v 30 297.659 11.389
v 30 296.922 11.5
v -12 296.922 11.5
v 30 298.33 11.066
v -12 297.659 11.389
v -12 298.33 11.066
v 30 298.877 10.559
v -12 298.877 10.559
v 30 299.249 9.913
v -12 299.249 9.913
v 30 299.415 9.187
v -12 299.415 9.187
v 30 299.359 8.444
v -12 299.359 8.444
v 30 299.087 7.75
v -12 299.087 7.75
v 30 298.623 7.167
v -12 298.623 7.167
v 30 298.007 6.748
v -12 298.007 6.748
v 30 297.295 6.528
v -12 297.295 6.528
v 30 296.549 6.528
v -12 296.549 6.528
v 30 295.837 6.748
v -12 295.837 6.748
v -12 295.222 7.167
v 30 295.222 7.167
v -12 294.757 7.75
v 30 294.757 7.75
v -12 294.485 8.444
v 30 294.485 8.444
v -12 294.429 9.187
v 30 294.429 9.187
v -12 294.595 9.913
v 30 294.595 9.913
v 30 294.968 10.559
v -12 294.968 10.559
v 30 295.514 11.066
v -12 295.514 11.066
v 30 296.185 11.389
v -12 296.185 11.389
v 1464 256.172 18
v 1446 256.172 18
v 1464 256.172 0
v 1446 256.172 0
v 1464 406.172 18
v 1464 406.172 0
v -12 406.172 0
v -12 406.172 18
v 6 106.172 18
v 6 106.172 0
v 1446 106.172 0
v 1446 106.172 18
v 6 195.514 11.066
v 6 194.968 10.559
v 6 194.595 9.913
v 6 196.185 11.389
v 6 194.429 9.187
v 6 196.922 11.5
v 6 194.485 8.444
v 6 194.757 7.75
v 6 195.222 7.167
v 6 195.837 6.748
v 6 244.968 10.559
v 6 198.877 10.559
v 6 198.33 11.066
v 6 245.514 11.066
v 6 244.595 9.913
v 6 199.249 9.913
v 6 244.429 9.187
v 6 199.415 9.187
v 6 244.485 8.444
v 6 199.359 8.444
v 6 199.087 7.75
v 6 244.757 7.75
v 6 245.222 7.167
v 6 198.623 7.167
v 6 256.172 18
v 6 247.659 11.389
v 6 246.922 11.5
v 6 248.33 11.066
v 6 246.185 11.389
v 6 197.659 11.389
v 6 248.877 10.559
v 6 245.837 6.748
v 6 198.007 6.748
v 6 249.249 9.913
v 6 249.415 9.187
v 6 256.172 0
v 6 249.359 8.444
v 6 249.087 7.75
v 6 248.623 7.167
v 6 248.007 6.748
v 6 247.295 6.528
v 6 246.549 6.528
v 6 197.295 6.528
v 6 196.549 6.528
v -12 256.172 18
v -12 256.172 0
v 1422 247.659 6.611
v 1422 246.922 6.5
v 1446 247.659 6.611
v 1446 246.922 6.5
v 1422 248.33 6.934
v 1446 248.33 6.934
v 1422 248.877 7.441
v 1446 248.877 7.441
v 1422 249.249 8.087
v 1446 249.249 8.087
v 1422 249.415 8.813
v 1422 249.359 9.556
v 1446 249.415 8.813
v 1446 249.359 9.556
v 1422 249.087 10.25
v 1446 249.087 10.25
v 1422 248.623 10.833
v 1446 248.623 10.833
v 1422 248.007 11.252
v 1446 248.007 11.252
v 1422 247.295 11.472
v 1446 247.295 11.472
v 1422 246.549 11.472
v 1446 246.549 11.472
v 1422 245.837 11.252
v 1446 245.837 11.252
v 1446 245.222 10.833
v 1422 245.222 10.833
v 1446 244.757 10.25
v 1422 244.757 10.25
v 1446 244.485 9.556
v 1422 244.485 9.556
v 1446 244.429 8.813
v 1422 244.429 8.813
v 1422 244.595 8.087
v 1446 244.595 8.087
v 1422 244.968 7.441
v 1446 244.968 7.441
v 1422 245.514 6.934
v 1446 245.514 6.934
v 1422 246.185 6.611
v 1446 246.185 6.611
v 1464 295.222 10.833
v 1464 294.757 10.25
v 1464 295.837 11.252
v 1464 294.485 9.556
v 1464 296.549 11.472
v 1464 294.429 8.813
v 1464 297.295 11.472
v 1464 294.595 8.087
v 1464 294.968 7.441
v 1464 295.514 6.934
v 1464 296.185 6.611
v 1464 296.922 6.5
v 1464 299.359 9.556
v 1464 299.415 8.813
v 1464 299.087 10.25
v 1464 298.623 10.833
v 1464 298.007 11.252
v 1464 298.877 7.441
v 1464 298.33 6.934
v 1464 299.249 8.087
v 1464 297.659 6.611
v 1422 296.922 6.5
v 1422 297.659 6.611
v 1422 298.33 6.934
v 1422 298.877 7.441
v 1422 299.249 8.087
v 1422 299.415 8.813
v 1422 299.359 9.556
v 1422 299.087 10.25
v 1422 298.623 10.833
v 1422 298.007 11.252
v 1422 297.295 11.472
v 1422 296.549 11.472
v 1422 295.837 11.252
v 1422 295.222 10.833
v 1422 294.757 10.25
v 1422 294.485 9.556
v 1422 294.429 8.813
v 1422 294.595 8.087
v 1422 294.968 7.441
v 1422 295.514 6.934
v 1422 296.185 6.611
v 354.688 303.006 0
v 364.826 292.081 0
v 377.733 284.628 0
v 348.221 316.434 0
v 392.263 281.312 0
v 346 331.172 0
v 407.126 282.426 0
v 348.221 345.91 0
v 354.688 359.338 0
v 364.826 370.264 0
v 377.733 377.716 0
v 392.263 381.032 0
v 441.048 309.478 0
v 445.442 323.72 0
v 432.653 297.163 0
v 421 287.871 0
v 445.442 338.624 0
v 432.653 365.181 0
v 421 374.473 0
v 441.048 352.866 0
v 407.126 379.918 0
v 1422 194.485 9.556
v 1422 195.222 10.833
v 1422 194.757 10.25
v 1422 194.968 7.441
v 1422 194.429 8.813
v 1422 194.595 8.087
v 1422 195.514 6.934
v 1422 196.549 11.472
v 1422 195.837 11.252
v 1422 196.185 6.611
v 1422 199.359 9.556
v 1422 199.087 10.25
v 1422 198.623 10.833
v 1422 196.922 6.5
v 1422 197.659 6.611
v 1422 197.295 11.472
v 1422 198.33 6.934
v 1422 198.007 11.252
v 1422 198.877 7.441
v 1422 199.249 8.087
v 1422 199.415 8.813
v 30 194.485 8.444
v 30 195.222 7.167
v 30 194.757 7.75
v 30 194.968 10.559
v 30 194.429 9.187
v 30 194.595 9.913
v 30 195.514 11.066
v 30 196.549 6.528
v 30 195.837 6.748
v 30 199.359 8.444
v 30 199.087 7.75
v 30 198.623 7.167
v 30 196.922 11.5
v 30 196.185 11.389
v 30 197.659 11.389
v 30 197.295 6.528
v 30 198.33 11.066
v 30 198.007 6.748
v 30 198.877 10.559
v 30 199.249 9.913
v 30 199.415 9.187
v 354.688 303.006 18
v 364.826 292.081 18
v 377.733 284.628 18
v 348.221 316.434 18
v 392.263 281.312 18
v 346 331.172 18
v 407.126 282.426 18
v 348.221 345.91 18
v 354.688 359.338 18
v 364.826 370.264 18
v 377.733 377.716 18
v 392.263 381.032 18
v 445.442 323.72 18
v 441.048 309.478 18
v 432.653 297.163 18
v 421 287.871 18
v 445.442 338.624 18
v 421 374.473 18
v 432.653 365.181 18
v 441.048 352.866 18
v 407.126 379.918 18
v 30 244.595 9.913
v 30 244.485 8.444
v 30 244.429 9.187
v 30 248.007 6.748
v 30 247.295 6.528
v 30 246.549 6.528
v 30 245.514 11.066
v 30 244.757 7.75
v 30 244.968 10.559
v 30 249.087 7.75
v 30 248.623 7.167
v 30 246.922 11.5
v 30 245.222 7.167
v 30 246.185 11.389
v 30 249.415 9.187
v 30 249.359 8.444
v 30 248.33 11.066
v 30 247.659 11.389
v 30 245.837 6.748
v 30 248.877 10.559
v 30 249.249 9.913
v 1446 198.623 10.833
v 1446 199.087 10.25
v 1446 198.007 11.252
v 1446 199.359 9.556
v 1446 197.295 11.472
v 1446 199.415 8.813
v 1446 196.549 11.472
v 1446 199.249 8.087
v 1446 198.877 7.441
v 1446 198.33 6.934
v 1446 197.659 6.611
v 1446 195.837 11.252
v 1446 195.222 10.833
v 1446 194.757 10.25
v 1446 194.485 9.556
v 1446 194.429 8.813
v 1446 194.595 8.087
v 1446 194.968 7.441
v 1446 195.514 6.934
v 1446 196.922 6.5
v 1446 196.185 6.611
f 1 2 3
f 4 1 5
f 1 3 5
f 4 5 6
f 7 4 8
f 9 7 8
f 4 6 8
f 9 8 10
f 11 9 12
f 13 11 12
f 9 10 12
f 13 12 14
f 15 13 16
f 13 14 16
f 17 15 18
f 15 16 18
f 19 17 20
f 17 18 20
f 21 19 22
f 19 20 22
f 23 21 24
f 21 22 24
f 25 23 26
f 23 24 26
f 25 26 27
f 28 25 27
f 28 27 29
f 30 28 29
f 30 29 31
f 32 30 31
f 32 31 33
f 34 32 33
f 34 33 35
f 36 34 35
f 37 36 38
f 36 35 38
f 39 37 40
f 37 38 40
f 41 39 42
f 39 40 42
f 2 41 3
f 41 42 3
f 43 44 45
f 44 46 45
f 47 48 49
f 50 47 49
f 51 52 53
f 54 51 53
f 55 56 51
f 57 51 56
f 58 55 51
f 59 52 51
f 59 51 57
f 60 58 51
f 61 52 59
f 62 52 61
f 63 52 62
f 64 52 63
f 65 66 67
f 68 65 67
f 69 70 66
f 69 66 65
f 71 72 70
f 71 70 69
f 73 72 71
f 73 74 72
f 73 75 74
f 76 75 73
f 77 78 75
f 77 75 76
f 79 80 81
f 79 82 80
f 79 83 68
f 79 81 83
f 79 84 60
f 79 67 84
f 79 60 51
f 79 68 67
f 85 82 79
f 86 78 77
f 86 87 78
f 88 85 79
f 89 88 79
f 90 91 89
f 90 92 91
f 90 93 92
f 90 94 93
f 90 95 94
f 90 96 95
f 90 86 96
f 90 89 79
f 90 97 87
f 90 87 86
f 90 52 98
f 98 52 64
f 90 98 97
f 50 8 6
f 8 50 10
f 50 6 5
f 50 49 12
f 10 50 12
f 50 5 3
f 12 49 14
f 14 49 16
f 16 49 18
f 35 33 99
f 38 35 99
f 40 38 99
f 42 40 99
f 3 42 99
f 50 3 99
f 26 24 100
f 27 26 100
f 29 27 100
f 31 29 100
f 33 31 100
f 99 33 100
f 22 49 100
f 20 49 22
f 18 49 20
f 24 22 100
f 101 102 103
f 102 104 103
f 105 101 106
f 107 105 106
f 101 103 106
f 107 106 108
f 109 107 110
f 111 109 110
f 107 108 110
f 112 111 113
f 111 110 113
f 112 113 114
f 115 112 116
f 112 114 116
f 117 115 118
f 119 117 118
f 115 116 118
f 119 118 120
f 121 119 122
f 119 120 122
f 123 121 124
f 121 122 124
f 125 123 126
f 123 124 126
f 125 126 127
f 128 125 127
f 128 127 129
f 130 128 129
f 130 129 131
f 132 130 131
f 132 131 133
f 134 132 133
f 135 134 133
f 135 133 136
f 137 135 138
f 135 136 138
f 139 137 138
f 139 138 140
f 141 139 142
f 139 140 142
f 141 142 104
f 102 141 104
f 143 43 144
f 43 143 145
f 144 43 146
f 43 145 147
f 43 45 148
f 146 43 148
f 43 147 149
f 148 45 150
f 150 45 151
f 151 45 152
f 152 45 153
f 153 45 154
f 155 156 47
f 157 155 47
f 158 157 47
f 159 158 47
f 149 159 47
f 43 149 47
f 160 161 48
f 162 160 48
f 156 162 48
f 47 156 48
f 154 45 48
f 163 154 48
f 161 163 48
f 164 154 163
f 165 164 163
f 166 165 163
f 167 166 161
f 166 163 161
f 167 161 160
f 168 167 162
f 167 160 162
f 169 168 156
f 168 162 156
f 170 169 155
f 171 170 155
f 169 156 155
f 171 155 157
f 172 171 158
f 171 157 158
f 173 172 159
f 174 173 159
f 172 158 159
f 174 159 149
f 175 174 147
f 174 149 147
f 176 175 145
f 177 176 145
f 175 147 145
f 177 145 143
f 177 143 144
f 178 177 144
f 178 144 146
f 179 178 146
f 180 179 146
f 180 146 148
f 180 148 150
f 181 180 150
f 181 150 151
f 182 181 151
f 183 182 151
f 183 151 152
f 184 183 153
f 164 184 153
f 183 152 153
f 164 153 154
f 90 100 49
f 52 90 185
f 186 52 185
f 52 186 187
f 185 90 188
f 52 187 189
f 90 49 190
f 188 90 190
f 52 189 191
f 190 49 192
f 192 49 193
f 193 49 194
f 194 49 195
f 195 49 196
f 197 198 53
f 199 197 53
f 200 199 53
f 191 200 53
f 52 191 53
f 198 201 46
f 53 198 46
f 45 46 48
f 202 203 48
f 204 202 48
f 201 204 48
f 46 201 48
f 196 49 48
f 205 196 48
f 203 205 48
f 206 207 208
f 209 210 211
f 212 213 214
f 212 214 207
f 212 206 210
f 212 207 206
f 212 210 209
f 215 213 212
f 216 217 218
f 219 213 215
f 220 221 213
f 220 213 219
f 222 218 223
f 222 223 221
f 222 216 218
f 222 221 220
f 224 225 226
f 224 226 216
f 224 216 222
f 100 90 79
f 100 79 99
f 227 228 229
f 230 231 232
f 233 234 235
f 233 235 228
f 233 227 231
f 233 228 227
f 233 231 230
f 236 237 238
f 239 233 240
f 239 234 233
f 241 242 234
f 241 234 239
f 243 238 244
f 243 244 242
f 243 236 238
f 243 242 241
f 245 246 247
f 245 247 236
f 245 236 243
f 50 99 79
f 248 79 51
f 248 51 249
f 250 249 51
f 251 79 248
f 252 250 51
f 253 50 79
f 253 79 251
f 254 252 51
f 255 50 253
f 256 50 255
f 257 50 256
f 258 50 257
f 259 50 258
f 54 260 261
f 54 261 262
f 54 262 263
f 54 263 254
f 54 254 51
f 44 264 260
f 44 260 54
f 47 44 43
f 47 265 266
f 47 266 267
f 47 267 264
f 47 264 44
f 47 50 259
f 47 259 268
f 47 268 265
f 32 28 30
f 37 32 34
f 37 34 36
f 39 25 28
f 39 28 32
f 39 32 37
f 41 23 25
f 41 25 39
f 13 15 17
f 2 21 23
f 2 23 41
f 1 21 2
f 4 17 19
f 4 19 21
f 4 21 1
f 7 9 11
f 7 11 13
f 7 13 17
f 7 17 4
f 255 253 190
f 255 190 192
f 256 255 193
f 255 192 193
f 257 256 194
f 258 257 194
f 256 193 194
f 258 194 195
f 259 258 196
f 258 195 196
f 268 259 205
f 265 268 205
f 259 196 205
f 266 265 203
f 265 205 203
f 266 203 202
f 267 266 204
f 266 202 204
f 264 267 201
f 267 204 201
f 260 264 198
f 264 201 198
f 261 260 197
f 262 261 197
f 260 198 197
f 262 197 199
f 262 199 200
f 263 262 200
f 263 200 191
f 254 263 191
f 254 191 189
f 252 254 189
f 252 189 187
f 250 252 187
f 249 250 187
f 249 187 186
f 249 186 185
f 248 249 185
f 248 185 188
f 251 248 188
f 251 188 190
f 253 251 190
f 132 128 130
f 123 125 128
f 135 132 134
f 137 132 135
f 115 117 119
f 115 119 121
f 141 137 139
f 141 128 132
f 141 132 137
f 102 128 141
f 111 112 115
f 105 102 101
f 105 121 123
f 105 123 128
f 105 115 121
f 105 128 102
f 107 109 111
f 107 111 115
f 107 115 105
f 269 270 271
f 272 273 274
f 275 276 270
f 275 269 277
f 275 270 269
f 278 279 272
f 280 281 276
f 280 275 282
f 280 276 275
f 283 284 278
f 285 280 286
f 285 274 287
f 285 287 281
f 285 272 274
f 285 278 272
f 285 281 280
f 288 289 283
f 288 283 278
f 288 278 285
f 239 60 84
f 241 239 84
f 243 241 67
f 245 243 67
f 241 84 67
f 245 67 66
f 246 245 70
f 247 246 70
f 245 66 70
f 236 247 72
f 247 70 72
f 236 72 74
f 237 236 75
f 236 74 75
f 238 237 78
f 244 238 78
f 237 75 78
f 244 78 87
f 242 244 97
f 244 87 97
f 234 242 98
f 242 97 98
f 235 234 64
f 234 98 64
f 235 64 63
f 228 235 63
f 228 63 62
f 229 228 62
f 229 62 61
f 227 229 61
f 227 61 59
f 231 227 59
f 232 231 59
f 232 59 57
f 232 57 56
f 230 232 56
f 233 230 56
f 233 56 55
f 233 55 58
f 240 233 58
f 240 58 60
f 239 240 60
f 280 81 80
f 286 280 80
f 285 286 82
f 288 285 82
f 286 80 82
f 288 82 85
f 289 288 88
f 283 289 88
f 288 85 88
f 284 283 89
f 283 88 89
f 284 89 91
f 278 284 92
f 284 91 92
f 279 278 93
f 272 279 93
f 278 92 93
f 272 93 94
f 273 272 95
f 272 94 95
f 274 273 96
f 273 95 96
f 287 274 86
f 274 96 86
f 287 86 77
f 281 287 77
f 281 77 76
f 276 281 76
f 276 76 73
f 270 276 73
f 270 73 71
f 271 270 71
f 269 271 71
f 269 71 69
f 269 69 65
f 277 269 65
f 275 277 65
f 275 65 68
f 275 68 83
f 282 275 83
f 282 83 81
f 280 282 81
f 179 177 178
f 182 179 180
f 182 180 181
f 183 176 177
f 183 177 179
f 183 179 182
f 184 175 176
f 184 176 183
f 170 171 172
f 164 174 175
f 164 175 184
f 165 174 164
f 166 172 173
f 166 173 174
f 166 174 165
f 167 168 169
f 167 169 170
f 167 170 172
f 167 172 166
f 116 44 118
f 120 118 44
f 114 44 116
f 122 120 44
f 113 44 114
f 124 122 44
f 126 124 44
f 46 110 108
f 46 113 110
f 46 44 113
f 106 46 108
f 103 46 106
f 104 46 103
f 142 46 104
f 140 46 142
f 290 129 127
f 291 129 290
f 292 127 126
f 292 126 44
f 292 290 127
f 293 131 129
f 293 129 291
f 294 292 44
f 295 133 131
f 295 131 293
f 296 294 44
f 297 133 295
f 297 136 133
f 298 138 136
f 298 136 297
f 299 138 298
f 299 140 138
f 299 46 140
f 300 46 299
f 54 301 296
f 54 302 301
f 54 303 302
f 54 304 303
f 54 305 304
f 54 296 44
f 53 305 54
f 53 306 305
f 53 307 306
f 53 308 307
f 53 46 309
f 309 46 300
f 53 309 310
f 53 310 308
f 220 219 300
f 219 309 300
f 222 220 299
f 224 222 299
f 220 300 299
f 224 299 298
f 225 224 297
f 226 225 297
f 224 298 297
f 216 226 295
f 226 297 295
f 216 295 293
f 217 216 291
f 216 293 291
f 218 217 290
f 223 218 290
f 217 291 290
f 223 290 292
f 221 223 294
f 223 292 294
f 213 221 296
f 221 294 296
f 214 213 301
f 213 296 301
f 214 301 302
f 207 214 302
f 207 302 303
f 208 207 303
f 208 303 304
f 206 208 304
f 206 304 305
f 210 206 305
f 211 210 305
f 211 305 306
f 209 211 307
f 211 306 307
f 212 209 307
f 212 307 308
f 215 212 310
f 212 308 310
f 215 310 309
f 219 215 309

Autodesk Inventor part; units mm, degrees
ref_plane "YZ Plane" through (0, 0, 0) normal (1, 0, 0) x (0, 1, 0)
ref_plane "XZ Plane" through (0, 0, 0) normal (0, 1, 0) x (-1, 0, 0)
ref_plane "XY Plane" through (0, 0, 0) normal (0, 0, 1) x (1, 0, 0)
sketch "Sketch1" plane through (0, 0, 0) normal (0, 0, 1) x (1, 0, 0)
  line L0 (-12, 106.1721) -> (1464, 106.1721)
  line L1 (1464, 106.1721) -> (1464, 406.1721)
  line L2 (1464, 406.1721) -> (-12, 406.1721)
  line L3 (-12, 406.1721) -> (-12, 106.1721)
  line L4 (-12, 406.1721) -> (18, 406.1721)
  line L5 (1464, 406.1721) -> (1446, 406.1721)
  line L6 (1446, 256.1721) -> (1464, 256.1721)
  line L7 (1464, 256.1721) -> (1464, 406.1721)
  line L8 (1446, 256.1721) -> (1446, 106.1721)
  line L9 (-12, 106.1721) -> (6, 106.1721)
  line L10 (6, 106.1721) -> (6, 256.1721)
  line L11 (6, 256.1721) -> (-12, 256.1721)
  line L12 (-12, 256.1721) -> (-12, 106.1721)
  point P0 (0, 0)
  point P1 (18, 106.1721)
  dimension "d1" = 1476
  dimension "d2" = 300
  dimension "d5" = 18
  dimension "d6" = 150
  dimension "d35" = 18
  dimension "d36" = 150
extrude "Extrusion1" add sketch "Sketch1" along normal blind 18 contours L3 L11 L10 L0 | L10 L11 L3 L2 L1 L6 L8 L0
sketch "Sketch2" plane through (-12, 256.1721, 0) normal (-1, 0, 0) x (0, 0, 1)
  line L0 (0, 0) -> (0, 150) projected
  line L1 (0, 150) -> (9, 150)
  line L2 (18, 0) -> (18, 150) projected
  line L3 (0, 150) -> (9, 150) construction
  line L4 (0, 150) -> (18, 150) projected
  line L5 (9, 150) -> (168.25, 150) construction
  line L6 (9, 150) -> (168.25, 150) construction
  line L7 (0, -150) -> (0, 0) projected
  line L8 (9, -9.25) -> (59, -9.25) construction
  circle A0 centre (9, -59.25) radius 2.5
  circle A1 centre (9, 40.75) radius 2.5
  circle A2 centre (9, -9.25) radius 2.5
  point P0 (0, -256.1721)
  dimension "d10" = 0
  dimension "d16" = 159.25
  dimension "d21" = 5
  dimension "d22" = 5
  dimension "d23" = 5
sketch "Sketch3" plane through (1464, 256.1721, 0) normal (1, 0, 0) x (0, 0, -1)
  line L0 (0, 0) -> (0, 150) projected
  line L1 (0, 150) -> (-9, 150)
  circle A0 centre (-9, 40.75) radius 2.5
  circle A1 centre (-9, -9.25) radius 2.5
  circle A2 centre (-9, -59.25) radius 2.5
  point P0 (0, -256.1721)
  dimension "d24" = 9
  dimension "d28" = 5
  dimension "d29" = 5
  dimension "d30" = 5
extrude "Extrusion2" cut sketch "Sketch3" against normal blind 42
extrude "Extrusion3" cut sketch "Sketch2" against normal blind 42
sketch "Sketch4" plane through (0, 0, 0) normal (0, 0, -1) x (-1, 0, 0)
  line L0 (12, 106.1721) -> (-1446, 106.1721) projected
  line L1 (12, 106.1721) -> (-6, 106.1721)
  line L2 (-6, 106.1721) -> (-6, 256.1721)
  line L3 (-6, 256.1721) -> (12, 256.1721)
  line L4 (12, 256.1721) -> (12, 106.1721)
  point P0 (0, 0)
  dimension "d39" = 18
  dimension "d40" = 150
extrude "Extrusion4" cut sketch "Sketch4" against normal blind 208.825
sketch "Sketch5" plane through (0, 0, 0) normal (0, 0, -1) x (-1, 0, 0)
  line L0 (-1446, 256.1721) -> (-1464, 256.1721) projected
  line L1 (-6, 256.1721) -> (379, 256.1721) construction
  circle A0 centre (-396, 331.1721) radius 50
  point P0 (0, 0)
  dimension "d53" = 100
extrude "Extrusion5" cut sketch "Sketch5" against normal blind 208.825
properties part number "reardraws" material "MDF Medium Density Fiberboard"
